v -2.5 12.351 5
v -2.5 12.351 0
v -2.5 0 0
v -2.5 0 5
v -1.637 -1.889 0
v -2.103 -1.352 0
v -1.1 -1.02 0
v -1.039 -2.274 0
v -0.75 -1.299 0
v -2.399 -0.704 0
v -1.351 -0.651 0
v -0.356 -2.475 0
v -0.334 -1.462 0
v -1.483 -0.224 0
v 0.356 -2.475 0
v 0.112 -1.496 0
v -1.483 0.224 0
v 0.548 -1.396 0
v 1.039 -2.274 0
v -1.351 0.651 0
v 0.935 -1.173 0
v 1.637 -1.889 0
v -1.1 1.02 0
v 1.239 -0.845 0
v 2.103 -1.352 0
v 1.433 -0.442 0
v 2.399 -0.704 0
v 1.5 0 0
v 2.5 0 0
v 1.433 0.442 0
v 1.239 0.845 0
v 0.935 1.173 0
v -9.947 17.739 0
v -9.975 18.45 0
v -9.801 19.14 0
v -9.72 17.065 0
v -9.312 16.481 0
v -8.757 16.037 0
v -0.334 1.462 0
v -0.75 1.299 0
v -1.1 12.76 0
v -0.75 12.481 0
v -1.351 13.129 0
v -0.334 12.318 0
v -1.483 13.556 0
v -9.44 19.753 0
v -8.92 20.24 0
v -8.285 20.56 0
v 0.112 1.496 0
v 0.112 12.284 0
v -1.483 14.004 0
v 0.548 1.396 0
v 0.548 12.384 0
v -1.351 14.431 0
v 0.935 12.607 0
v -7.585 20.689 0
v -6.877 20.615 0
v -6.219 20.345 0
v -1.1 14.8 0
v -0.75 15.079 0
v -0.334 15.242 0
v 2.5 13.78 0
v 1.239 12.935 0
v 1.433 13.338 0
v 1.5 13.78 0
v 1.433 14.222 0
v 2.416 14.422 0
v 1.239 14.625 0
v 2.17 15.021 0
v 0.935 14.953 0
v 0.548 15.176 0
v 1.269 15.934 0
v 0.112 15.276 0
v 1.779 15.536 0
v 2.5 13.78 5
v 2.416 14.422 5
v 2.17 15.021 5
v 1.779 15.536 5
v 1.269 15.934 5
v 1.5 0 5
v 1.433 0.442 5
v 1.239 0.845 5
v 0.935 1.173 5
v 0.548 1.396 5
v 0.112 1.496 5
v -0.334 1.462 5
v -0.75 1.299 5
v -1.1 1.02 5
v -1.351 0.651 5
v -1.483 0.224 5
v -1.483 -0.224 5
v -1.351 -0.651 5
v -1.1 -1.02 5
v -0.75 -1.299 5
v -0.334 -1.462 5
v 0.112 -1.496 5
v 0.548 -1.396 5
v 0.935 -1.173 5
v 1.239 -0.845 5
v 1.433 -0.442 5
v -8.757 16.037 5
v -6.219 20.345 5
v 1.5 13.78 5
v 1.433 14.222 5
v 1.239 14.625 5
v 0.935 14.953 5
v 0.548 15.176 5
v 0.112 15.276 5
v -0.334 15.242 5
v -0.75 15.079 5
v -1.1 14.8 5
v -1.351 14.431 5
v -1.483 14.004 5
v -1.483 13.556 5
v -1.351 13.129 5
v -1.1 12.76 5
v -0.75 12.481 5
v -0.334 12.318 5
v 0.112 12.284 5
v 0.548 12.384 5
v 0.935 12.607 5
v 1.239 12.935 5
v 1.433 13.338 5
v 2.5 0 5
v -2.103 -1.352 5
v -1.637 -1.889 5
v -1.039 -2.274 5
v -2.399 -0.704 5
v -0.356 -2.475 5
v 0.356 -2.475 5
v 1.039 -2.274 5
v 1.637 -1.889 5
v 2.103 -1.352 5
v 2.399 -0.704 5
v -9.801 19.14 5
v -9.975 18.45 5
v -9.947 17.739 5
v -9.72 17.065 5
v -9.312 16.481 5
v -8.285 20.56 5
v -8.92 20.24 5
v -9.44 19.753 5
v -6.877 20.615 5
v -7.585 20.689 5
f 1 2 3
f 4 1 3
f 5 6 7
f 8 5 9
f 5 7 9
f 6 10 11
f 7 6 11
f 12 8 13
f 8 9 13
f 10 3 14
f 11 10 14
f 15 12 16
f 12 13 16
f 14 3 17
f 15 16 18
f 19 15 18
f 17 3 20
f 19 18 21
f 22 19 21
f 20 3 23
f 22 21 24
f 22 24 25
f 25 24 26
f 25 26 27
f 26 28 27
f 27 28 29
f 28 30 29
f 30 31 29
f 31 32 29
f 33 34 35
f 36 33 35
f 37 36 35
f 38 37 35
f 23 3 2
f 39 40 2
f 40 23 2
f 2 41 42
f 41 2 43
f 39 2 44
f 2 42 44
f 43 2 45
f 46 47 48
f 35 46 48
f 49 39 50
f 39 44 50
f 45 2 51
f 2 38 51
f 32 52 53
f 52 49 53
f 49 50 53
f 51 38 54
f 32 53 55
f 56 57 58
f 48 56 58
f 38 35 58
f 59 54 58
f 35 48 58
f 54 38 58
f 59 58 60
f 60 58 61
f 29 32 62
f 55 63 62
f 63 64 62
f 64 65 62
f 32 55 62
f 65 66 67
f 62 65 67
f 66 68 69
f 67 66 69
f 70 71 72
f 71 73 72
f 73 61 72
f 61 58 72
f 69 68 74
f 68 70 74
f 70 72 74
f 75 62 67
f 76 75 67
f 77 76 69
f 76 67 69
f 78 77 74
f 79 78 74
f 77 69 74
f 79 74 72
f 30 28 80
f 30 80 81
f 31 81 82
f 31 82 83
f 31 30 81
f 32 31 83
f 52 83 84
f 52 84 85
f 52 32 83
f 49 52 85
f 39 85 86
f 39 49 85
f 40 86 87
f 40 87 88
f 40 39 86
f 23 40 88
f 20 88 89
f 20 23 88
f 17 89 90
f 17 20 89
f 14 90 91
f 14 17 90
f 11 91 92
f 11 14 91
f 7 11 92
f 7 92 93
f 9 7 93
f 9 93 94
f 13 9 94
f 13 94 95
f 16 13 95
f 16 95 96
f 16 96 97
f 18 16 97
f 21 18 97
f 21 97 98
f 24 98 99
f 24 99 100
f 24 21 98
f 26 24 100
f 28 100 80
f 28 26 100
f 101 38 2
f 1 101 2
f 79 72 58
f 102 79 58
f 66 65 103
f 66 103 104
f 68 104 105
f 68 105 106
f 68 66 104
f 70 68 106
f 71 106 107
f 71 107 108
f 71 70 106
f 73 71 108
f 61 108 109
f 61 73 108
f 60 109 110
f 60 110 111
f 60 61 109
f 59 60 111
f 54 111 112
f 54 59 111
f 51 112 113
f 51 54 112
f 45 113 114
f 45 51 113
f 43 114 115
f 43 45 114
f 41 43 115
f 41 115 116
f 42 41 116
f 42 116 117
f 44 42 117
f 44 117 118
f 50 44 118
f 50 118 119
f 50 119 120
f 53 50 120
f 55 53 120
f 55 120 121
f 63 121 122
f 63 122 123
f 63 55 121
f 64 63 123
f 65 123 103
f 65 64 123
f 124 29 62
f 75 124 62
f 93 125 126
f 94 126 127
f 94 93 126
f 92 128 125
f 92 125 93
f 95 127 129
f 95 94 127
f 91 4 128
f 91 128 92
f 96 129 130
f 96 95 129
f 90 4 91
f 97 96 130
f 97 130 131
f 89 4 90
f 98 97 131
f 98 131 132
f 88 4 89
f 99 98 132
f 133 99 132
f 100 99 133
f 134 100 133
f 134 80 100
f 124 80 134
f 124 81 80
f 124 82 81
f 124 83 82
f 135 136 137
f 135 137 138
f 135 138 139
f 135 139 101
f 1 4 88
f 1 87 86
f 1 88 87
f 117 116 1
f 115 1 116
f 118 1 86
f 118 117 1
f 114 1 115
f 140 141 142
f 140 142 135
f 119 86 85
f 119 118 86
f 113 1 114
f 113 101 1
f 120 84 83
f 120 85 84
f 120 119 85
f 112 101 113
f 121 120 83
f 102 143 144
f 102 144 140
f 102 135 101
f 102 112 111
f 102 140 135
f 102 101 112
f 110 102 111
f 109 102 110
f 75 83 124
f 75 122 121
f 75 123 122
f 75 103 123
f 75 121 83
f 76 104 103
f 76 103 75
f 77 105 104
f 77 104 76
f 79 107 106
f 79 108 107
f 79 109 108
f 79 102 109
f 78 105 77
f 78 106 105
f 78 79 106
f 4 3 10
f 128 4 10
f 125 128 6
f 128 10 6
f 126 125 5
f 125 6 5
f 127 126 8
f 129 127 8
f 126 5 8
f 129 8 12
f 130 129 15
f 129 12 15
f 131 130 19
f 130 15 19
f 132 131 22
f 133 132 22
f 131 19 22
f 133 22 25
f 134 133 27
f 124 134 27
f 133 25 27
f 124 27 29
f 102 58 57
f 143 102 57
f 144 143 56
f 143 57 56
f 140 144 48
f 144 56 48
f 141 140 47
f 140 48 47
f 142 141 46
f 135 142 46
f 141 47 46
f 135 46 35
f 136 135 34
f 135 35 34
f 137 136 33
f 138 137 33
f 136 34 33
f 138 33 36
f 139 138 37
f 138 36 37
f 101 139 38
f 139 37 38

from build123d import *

# Parameters (mm, degrees)
SKIZZE1_R                       = 1.5
AUFSATZ_LINEAR_AUSTRAGEN1_DEPTH = 5


with BuildPart() as part:
    # Skizze1 → Aufsatz-Linear austragen1 (new body)
    with BuildSketch(Plane.XY):
        with BuildLine():
            ThreePointArc((-2.5, 0), (0, -2.5), (2.5, 0))
            Line((2.5, 0), (2.5, 13.78))
            ThreePointArc((2.5, 13.78), (2.170497036, 15.020541259), (1.268845907, 15.934072901))
            Line((1.268845907, 15.934072901), (-6.219211481, 20.344875789))
            ThreePointArc((-6.219211481, 20.344875789), (-9.64213029, 19.459648795), (-8.756903296, 16.036729986))
            Line((-8.756903296, 16.036729986), (-2.5, 12.351132282))
            Line((-2.5, 12.351132282), (-2.5, 0))
        make_face()
        Circle(SKIZZE1_R, mode=Mode.SUBTRACT)
        with Locations((0, 13.78)):
            Circle(SKIZZE1_R, mode=Mode.SUBTRACT)
    extrude(amount=AUFSATZ_LINEAR_AUSTRAGEN1_DEPTH)


solid = part.part
